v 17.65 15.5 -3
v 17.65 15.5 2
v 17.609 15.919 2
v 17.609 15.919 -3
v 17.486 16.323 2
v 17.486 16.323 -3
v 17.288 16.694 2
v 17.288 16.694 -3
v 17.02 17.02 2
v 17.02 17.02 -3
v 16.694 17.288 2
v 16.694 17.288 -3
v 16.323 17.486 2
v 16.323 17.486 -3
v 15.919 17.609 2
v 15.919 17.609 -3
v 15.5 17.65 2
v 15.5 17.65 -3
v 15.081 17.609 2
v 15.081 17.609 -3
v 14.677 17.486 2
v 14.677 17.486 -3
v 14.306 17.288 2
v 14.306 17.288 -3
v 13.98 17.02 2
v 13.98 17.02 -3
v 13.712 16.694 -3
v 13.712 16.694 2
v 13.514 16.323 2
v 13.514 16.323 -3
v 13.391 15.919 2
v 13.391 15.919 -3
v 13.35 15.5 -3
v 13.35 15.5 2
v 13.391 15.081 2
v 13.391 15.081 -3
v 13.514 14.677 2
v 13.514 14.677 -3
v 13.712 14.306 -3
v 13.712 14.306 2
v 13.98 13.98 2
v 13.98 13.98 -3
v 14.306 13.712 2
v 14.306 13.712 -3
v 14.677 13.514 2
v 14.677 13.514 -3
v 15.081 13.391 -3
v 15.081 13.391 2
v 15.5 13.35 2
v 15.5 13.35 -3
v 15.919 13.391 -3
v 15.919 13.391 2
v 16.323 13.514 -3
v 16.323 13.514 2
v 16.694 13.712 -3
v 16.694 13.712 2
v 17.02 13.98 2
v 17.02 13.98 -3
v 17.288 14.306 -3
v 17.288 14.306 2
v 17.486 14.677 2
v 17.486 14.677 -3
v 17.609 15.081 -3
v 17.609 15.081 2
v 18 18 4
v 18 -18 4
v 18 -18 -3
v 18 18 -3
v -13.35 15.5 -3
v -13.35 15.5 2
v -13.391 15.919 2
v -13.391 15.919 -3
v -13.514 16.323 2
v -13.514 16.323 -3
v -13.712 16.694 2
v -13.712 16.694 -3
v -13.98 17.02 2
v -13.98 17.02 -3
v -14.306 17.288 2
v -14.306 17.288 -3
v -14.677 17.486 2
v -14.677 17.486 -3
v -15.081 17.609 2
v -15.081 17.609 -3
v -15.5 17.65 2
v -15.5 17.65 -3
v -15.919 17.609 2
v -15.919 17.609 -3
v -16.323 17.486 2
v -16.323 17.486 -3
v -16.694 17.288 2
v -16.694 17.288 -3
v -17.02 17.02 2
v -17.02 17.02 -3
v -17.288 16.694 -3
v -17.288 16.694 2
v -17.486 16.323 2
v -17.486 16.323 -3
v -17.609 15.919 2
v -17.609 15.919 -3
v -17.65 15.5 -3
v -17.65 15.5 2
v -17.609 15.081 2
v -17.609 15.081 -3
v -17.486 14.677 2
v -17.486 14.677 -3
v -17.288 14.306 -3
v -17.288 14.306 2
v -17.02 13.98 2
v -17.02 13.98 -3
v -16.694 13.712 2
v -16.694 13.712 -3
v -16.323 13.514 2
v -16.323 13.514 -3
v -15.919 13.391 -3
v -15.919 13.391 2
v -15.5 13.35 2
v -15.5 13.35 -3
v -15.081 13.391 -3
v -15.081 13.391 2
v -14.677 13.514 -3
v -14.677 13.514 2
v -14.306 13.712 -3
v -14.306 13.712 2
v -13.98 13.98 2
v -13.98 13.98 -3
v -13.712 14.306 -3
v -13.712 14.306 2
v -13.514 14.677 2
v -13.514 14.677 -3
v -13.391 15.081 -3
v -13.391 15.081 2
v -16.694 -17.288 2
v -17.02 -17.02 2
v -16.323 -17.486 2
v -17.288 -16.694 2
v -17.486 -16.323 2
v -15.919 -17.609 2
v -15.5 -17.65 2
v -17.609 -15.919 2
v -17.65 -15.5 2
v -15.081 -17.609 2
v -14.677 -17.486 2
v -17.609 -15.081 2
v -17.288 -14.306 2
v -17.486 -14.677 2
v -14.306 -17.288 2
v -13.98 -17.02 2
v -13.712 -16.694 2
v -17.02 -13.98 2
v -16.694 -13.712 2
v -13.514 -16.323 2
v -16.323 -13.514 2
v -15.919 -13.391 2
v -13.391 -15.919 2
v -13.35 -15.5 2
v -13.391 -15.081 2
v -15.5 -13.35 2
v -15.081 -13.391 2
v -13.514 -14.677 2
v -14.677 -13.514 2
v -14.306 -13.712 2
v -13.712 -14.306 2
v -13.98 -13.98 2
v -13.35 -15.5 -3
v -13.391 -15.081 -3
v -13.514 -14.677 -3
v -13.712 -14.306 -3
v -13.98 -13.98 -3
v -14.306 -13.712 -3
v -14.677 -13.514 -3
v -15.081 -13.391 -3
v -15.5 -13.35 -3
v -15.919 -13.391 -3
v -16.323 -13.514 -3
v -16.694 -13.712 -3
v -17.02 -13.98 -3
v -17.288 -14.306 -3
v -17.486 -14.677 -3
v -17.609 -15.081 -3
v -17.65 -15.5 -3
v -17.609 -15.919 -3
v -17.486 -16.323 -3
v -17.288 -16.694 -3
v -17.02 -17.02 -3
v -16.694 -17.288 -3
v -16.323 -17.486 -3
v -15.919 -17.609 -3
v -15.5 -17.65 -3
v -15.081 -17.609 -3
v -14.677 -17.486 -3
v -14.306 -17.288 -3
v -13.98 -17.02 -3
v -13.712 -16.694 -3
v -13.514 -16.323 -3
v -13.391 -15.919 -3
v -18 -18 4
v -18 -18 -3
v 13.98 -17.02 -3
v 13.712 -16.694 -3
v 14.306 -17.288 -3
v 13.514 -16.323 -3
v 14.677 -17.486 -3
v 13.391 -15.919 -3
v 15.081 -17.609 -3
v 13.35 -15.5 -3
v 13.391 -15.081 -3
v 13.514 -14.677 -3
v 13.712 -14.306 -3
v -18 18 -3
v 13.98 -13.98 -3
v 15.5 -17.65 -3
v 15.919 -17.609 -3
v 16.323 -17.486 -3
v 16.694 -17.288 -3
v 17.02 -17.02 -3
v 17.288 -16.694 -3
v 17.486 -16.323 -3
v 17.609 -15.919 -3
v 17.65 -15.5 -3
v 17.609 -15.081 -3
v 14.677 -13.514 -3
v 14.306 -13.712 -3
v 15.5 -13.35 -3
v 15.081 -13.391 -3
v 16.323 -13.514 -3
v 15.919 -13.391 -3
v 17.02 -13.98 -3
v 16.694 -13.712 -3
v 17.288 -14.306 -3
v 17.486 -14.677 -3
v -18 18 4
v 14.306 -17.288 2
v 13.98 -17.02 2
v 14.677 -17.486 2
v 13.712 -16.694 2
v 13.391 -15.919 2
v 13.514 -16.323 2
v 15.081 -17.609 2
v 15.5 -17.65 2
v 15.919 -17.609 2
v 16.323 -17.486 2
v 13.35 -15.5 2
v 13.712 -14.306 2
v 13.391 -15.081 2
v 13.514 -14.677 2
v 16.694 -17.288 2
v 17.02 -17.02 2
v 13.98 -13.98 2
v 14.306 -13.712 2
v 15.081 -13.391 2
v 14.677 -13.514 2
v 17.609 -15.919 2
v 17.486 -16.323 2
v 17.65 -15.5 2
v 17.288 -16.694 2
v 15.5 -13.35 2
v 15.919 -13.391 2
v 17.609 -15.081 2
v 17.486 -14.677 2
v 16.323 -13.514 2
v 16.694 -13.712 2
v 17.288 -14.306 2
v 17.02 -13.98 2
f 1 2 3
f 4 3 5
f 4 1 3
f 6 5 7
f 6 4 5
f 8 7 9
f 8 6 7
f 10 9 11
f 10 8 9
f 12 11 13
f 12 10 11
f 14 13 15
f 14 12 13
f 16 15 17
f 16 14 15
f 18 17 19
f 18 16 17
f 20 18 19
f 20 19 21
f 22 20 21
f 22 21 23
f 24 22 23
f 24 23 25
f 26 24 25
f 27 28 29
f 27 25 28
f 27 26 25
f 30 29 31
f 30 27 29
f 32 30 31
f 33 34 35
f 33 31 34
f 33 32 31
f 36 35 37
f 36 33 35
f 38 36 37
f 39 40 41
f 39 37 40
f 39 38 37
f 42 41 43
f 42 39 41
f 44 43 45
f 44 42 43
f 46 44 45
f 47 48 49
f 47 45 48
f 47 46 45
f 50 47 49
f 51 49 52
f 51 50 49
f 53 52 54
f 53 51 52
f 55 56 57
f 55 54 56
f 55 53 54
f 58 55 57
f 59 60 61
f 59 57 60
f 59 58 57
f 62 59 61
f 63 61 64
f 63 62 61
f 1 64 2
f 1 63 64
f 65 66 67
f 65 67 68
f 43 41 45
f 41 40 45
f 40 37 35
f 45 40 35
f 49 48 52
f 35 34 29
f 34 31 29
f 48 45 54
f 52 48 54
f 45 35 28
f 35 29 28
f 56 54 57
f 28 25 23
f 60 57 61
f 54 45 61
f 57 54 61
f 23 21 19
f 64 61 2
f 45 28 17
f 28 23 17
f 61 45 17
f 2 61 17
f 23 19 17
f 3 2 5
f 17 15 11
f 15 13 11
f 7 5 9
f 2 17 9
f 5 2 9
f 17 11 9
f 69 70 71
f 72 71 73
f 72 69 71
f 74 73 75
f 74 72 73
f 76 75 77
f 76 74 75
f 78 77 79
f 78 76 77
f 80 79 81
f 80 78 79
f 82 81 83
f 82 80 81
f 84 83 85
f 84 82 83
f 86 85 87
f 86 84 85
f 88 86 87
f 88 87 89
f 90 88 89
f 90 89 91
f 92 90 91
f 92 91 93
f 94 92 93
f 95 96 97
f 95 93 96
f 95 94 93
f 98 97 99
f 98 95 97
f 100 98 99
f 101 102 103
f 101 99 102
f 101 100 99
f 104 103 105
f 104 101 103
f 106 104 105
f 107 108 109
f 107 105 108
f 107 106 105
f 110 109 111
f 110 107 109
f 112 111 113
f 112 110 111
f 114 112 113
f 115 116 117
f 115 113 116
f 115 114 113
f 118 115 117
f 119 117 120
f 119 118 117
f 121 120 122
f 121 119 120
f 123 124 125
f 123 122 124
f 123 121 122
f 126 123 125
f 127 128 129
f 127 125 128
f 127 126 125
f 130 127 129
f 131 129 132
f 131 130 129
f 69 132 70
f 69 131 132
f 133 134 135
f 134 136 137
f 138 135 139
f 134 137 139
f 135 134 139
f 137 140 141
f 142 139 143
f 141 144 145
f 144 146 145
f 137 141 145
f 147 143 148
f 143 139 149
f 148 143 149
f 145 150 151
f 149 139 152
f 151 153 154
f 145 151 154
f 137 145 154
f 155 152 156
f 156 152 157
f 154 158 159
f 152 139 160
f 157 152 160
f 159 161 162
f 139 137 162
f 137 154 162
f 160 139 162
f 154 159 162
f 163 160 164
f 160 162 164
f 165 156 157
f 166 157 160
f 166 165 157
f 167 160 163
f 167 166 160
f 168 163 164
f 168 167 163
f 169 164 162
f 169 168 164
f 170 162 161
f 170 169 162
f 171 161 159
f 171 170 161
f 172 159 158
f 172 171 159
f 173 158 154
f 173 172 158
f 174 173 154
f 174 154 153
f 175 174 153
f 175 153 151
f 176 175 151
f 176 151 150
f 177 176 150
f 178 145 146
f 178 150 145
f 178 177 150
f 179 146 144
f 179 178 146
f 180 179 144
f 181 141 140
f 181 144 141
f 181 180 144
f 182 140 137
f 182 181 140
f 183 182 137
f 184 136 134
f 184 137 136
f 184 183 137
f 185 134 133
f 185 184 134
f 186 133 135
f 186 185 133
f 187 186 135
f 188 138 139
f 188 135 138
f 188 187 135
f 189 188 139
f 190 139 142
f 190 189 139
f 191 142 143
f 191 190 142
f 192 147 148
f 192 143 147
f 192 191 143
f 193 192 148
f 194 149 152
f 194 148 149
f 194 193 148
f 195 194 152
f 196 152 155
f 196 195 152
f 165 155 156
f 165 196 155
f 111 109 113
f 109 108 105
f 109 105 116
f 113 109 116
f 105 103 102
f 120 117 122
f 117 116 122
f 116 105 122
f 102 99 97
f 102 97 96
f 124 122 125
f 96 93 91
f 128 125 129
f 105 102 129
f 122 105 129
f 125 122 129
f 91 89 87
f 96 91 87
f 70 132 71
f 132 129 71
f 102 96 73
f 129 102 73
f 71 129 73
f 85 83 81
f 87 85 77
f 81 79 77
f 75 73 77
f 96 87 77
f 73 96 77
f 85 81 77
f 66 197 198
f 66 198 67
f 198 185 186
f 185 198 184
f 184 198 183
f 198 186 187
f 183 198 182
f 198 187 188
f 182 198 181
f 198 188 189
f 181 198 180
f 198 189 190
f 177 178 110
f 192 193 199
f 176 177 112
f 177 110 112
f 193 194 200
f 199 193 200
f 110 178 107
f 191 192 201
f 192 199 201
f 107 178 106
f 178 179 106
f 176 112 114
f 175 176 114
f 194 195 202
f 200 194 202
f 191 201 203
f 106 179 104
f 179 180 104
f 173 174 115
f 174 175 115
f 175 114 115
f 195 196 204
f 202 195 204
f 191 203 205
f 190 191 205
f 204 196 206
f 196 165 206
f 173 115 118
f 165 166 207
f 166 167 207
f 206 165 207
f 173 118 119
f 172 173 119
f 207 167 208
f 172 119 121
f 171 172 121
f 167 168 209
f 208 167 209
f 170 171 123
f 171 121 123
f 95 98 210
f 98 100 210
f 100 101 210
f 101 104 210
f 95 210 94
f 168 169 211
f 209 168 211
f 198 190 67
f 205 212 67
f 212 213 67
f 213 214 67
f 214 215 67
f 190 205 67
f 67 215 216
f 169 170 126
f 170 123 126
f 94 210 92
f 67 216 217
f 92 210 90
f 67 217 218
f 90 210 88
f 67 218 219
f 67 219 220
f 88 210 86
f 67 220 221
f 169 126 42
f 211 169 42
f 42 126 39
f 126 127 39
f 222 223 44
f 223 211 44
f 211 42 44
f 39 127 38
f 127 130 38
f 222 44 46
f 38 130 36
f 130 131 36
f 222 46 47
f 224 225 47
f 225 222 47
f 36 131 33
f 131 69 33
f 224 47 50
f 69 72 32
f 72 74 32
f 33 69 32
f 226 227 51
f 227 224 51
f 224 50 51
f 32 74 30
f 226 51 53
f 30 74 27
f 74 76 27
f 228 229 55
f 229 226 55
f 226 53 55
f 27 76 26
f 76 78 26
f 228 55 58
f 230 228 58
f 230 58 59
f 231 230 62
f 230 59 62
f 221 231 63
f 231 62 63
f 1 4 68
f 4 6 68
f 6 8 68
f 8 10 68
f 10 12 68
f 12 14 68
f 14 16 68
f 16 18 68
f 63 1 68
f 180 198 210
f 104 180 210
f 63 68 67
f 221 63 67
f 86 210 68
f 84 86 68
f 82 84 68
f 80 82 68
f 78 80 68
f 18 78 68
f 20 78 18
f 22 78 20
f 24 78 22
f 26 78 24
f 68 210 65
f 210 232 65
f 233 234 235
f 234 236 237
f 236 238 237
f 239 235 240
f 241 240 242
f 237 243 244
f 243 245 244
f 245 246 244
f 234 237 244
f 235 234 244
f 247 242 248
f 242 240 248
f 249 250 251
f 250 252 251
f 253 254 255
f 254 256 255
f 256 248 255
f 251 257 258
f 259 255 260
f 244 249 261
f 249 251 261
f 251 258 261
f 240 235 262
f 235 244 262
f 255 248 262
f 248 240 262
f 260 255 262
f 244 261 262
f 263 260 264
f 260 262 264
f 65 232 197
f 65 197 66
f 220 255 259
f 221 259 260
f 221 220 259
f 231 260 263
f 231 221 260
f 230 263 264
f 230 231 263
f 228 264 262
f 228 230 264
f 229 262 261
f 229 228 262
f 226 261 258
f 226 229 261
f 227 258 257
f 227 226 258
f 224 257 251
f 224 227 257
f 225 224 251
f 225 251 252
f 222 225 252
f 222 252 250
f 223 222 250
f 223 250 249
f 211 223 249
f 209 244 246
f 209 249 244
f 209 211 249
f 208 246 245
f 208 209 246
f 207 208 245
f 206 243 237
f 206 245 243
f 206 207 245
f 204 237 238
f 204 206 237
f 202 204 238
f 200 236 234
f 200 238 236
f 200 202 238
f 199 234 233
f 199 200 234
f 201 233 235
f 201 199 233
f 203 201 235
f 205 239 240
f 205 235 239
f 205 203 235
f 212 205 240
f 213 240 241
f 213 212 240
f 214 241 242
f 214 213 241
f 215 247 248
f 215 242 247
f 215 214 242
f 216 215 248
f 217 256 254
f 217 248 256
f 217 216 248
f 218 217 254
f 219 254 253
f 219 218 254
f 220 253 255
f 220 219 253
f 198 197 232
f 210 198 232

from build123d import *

# Parameters (mm, degrees)
SKETCH1_W               = 36
SKETCH1_H               = 36
SKETCH1_R               = 2.15
BOSS_EXTRUDE1_DEPTH     = 3
BOSS_EXTRUDE2_START     = 2
BOSS_EXTRUDE2_OUTLINE_W = 36
BOSS_EXTRUDE2_OUTLINE_H = 36
BOSS_EXTRUDE2_DEPTH     = 2


# Read off the part's stored shape, not the designer's step: Boss-Extrude2
with BuildPart() as part:
    # Sketch1 → Boss-Extrude1 (new, symmetric)
    with BuildSketch(Plane.XY):
        Rectangle(SKETCH1_W, SKETCH1_H)
        with Locations((-15.5, 15.5)):
            Circle(SKETCH1_R, mode=Mode.SUBTRACT)
        with Locations((15.5, 15.5)):
            Circle(SKETCH1_R, mode=Mode.SUBTRACT)
        with Locations((15.5, -15.5)):
            Circle(SKETCH1_R, mode=Mode.SUBTRACT)
        with Locations((-15.5, -15.5)):
            Circle(SKETCH1_R, mode=Mode.SUBTRACT)
    extrude(amount=BOSS_EXTRUDE1_DEPTH, both=True)

    # Boss-Extrude2 outline → Boss-Extrude2 (add)
    with BuildSketch(Plane.XY.offset(BOSS_EXTRUDE2_START)):
        Rectangle(BOSS_EXTRUDE2_OUTLINE_W, BOSS_EXTRUDE2_OUTLINE_H)
    extrude(amount=BOSS_EXTRUDE2_DEPTH)


solid = part.part
